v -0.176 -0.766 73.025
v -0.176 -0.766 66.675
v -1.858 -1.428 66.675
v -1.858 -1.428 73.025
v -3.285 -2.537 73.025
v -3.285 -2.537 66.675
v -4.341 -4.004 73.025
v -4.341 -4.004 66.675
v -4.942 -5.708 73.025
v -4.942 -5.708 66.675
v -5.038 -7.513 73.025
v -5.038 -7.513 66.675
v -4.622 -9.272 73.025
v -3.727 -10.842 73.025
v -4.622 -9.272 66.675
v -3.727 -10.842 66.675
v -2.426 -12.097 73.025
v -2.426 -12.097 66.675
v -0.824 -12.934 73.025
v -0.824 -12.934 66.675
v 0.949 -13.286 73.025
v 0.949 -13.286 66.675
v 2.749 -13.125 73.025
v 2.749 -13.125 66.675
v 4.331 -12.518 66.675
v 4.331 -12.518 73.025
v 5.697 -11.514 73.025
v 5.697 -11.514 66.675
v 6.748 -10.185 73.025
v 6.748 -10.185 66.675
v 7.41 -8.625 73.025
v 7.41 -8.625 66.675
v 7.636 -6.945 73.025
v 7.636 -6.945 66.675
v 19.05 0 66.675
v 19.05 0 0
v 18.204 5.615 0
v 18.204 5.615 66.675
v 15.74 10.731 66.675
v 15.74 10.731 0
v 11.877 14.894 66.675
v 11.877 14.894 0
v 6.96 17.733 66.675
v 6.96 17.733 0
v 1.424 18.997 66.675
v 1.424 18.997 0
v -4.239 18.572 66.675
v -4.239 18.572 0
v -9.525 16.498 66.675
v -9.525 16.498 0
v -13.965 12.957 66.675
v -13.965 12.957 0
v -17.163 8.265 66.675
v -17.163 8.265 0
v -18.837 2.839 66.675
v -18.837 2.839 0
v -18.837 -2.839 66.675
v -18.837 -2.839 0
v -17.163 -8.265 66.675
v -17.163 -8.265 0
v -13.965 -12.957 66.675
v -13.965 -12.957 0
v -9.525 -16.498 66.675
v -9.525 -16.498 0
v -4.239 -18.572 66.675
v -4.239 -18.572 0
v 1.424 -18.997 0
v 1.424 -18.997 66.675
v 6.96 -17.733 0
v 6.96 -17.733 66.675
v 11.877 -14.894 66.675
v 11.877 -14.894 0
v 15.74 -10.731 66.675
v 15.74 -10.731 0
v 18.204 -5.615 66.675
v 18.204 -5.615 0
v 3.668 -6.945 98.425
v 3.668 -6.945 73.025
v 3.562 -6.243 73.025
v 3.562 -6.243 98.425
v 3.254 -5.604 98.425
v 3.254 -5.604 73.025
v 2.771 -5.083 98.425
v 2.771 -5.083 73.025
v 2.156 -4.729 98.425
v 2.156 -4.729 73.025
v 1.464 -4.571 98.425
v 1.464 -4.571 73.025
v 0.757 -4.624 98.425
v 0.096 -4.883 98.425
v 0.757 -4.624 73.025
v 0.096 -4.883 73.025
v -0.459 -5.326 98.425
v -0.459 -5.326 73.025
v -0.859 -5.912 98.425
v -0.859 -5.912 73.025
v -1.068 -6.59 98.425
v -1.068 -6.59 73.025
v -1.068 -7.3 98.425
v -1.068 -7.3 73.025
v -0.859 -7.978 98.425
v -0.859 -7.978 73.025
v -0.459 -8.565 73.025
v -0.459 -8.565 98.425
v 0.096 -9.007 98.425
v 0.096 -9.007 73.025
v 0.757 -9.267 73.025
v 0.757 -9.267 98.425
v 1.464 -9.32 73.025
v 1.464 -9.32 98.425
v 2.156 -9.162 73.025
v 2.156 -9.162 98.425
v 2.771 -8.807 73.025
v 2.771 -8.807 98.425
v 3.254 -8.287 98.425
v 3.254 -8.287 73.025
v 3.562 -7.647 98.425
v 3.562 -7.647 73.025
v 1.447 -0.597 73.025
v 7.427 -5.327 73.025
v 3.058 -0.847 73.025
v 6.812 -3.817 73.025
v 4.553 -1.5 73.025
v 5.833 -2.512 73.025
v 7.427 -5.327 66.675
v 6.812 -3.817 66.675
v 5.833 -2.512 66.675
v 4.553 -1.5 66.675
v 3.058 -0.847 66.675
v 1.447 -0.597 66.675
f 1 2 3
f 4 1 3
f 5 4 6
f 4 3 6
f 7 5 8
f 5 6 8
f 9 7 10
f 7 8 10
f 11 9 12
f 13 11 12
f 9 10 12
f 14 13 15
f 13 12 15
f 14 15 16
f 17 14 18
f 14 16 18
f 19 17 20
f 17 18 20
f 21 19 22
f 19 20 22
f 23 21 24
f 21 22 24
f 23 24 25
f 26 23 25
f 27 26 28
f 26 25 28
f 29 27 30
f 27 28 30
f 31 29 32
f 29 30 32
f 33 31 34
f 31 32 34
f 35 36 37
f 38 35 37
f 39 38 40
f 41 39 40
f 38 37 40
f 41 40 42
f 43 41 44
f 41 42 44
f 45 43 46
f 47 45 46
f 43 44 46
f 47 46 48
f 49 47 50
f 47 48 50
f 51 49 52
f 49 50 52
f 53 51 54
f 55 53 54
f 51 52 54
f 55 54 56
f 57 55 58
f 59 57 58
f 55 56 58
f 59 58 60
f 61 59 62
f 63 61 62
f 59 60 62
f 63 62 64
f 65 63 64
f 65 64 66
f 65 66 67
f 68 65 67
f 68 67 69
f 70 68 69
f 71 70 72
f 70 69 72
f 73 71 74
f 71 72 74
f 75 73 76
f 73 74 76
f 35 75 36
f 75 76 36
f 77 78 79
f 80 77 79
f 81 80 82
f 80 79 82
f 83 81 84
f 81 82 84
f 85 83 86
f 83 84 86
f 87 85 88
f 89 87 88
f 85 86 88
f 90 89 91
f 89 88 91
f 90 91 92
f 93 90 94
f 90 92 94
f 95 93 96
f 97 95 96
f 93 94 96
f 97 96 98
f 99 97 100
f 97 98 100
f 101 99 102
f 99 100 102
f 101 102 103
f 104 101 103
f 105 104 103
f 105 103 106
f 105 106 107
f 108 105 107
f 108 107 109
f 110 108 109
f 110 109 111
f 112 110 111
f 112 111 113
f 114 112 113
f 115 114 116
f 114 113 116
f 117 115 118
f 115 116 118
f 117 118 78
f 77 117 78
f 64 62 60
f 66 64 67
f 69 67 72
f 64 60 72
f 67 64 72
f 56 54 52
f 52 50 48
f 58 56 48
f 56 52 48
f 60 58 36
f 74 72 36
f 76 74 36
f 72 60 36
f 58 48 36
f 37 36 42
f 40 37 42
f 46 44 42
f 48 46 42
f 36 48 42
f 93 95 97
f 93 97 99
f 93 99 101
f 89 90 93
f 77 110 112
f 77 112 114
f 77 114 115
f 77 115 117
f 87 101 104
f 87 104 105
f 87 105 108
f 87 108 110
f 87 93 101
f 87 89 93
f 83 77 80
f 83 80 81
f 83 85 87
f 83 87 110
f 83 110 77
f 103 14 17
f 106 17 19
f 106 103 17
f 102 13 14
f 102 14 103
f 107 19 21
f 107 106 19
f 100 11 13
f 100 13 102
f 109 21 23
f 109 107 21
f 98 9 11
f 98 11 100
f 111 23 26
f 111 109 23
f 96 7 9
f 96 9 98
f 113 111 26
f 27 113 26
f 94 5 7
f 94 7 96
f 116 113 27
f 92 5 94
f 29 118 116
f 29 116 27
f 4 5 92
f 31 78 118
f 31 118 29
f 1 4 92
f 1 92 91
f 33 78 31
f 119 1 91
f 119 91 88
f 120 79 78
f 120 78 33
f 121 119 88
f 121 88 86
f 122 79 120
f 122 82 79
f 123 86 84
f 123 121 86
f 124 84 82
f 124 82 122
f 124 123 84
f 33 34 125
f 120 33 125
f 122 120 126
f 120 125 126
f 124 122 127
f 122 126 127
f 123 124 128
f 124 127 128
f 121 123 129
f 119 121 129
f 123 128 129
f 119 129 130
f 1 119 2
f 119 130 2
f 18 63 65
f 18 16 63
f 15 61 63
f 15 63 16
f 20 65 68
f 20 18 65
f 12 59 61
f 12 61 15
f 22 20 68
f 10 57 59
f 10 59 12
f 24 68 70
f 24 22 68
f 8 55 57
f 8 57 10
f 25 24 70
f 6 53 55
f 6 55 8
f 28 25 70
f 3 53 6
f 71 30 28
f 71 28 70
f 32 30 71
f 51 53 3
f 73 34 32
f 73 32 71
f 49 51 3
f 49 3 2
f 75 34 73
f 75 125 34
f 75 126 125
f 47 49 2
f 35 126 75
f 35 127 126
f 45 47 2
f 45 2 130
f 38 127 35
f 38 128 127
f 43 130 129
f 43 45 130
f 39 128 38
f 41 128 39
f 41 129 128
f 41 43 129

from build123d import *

# Parameters (mm, degrees)
F0_R     = 19.05
F1_DEPTH = 66.675
F3_DEPTH = 6.35
F4_R     = 2.38125
F5_DEPTH = 25.4


with BuildPart() as f1:
    # F0 (on Top) → F1 (new body)
    with BuildSketch(Plane.XY):
        Circle(F0_R)
    extrude(amount=F1_DEPTH)

    # F2 (on face) → F3 (join)
    with BuildSketch(Plane.XY.offset(66.675)):
        with BuildLine():
            ThreePointArc((7.636474, -6.945197), (5.225781, -1.964799), (-0.175923, -0.765885))
            Line((-0.175923, -0.765885), (2.748871, -13.124509))
            ThreePointArc((2.748871, -13.124509), (6.266871, -10.884504), (7.636474, -6.945197))
        make_face()
        with BuildLine():
            Line((2.748871, -13.124509), (-0.175923, -0.765885))
            ThreePointArc((-0.175923, -0.765885), (-4.892838, -8.407594), (2.748871, -13.124509))
        make_face()
    extrude(amount=F3_DEPTH)

    # F4 (on face) → F5 (join)
    with BuildSketch(Plane.XY.offset(73.025)):
        with Locations((1.286474, -6.945197)):
            Circle(F4_R)
    extrude(amount=F5_DEPTH)


solid = f1.part
